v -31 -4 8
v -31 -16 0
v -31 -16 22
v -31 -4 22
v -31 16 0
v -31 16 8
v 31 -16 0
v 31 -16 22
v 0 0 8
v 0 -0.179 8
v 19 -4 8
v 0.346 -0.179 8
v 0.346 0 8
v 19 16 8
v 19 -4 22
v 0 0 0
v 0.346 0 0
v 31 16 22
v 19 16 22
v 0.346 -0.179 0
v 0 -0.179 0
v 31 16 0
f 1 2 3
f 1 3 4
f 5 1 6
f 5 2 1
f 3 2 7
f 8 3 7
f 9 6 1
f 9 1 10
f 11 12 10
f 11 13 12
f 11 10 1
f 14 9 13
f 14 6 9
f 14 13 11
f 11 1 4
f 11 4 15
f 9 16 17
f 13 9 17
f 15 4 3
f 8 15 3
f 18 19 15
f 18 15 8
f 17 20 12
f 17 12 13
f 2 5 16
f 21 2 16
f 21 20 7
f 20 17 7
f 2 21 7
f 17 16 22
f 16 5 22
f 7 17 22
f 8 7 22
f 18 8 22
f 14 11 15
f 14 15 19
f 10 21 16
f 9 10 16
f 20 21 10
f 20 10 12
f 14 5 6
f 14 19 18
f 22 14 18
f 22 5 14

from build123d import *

# Parameters (mm, degrees)
ESBO_O1_W                  = 62
ESBO_O1_H                  = 32
ESBO_O1_W_2                = 0.346266541
ESBO_O1_H_2                = 0.178718215
RESSALTO_EXTRUS_O1_DEPTH   = 22
CORTE_EXTRUS_O4_DEPTH      = 42.243181255
CORTE_EXTRUS_O4_DEPTH_BACK = 14
ESBO_O2_W                  = 50
ESBO_O2_H                  = 20


with BuildPart() as part:
    # Esboço1 → Ressalto-extrusão1 (new body)
    with BuildSketch(Plane.XY):
        Rectangle(ESBO_O1_W, ESBO_O1_H)
        with Locations((0.173133271, -0.089359108)):
            Rectangle(ESBO_O1_W_2, ESBO_O1_H_2, mode=Mode.SUBTRACT)
    extrude(amount=RESSALTO_EXTRUS_O1_DEPTH)

    # Esboço2 → Corte-extrusão4 (cut, two sides: drawn at the far end of the back side and taken through both)
    with BuildSketch(Plane.XY.offset(22).offset(-CORTE_EXTRUS_O4_DEPTH_BACK)):
        with Locations((-6, 6)):
            Rectangle(ESBO_O2_W, ESBO_O2_H)
    extrude(amount=CORTE_EXTRUS_O4_DEPTH + CORTE_EXTRUS_O4_DEPTH_BACK, mode=Mode.SUBTRACT)


solid = part.part
